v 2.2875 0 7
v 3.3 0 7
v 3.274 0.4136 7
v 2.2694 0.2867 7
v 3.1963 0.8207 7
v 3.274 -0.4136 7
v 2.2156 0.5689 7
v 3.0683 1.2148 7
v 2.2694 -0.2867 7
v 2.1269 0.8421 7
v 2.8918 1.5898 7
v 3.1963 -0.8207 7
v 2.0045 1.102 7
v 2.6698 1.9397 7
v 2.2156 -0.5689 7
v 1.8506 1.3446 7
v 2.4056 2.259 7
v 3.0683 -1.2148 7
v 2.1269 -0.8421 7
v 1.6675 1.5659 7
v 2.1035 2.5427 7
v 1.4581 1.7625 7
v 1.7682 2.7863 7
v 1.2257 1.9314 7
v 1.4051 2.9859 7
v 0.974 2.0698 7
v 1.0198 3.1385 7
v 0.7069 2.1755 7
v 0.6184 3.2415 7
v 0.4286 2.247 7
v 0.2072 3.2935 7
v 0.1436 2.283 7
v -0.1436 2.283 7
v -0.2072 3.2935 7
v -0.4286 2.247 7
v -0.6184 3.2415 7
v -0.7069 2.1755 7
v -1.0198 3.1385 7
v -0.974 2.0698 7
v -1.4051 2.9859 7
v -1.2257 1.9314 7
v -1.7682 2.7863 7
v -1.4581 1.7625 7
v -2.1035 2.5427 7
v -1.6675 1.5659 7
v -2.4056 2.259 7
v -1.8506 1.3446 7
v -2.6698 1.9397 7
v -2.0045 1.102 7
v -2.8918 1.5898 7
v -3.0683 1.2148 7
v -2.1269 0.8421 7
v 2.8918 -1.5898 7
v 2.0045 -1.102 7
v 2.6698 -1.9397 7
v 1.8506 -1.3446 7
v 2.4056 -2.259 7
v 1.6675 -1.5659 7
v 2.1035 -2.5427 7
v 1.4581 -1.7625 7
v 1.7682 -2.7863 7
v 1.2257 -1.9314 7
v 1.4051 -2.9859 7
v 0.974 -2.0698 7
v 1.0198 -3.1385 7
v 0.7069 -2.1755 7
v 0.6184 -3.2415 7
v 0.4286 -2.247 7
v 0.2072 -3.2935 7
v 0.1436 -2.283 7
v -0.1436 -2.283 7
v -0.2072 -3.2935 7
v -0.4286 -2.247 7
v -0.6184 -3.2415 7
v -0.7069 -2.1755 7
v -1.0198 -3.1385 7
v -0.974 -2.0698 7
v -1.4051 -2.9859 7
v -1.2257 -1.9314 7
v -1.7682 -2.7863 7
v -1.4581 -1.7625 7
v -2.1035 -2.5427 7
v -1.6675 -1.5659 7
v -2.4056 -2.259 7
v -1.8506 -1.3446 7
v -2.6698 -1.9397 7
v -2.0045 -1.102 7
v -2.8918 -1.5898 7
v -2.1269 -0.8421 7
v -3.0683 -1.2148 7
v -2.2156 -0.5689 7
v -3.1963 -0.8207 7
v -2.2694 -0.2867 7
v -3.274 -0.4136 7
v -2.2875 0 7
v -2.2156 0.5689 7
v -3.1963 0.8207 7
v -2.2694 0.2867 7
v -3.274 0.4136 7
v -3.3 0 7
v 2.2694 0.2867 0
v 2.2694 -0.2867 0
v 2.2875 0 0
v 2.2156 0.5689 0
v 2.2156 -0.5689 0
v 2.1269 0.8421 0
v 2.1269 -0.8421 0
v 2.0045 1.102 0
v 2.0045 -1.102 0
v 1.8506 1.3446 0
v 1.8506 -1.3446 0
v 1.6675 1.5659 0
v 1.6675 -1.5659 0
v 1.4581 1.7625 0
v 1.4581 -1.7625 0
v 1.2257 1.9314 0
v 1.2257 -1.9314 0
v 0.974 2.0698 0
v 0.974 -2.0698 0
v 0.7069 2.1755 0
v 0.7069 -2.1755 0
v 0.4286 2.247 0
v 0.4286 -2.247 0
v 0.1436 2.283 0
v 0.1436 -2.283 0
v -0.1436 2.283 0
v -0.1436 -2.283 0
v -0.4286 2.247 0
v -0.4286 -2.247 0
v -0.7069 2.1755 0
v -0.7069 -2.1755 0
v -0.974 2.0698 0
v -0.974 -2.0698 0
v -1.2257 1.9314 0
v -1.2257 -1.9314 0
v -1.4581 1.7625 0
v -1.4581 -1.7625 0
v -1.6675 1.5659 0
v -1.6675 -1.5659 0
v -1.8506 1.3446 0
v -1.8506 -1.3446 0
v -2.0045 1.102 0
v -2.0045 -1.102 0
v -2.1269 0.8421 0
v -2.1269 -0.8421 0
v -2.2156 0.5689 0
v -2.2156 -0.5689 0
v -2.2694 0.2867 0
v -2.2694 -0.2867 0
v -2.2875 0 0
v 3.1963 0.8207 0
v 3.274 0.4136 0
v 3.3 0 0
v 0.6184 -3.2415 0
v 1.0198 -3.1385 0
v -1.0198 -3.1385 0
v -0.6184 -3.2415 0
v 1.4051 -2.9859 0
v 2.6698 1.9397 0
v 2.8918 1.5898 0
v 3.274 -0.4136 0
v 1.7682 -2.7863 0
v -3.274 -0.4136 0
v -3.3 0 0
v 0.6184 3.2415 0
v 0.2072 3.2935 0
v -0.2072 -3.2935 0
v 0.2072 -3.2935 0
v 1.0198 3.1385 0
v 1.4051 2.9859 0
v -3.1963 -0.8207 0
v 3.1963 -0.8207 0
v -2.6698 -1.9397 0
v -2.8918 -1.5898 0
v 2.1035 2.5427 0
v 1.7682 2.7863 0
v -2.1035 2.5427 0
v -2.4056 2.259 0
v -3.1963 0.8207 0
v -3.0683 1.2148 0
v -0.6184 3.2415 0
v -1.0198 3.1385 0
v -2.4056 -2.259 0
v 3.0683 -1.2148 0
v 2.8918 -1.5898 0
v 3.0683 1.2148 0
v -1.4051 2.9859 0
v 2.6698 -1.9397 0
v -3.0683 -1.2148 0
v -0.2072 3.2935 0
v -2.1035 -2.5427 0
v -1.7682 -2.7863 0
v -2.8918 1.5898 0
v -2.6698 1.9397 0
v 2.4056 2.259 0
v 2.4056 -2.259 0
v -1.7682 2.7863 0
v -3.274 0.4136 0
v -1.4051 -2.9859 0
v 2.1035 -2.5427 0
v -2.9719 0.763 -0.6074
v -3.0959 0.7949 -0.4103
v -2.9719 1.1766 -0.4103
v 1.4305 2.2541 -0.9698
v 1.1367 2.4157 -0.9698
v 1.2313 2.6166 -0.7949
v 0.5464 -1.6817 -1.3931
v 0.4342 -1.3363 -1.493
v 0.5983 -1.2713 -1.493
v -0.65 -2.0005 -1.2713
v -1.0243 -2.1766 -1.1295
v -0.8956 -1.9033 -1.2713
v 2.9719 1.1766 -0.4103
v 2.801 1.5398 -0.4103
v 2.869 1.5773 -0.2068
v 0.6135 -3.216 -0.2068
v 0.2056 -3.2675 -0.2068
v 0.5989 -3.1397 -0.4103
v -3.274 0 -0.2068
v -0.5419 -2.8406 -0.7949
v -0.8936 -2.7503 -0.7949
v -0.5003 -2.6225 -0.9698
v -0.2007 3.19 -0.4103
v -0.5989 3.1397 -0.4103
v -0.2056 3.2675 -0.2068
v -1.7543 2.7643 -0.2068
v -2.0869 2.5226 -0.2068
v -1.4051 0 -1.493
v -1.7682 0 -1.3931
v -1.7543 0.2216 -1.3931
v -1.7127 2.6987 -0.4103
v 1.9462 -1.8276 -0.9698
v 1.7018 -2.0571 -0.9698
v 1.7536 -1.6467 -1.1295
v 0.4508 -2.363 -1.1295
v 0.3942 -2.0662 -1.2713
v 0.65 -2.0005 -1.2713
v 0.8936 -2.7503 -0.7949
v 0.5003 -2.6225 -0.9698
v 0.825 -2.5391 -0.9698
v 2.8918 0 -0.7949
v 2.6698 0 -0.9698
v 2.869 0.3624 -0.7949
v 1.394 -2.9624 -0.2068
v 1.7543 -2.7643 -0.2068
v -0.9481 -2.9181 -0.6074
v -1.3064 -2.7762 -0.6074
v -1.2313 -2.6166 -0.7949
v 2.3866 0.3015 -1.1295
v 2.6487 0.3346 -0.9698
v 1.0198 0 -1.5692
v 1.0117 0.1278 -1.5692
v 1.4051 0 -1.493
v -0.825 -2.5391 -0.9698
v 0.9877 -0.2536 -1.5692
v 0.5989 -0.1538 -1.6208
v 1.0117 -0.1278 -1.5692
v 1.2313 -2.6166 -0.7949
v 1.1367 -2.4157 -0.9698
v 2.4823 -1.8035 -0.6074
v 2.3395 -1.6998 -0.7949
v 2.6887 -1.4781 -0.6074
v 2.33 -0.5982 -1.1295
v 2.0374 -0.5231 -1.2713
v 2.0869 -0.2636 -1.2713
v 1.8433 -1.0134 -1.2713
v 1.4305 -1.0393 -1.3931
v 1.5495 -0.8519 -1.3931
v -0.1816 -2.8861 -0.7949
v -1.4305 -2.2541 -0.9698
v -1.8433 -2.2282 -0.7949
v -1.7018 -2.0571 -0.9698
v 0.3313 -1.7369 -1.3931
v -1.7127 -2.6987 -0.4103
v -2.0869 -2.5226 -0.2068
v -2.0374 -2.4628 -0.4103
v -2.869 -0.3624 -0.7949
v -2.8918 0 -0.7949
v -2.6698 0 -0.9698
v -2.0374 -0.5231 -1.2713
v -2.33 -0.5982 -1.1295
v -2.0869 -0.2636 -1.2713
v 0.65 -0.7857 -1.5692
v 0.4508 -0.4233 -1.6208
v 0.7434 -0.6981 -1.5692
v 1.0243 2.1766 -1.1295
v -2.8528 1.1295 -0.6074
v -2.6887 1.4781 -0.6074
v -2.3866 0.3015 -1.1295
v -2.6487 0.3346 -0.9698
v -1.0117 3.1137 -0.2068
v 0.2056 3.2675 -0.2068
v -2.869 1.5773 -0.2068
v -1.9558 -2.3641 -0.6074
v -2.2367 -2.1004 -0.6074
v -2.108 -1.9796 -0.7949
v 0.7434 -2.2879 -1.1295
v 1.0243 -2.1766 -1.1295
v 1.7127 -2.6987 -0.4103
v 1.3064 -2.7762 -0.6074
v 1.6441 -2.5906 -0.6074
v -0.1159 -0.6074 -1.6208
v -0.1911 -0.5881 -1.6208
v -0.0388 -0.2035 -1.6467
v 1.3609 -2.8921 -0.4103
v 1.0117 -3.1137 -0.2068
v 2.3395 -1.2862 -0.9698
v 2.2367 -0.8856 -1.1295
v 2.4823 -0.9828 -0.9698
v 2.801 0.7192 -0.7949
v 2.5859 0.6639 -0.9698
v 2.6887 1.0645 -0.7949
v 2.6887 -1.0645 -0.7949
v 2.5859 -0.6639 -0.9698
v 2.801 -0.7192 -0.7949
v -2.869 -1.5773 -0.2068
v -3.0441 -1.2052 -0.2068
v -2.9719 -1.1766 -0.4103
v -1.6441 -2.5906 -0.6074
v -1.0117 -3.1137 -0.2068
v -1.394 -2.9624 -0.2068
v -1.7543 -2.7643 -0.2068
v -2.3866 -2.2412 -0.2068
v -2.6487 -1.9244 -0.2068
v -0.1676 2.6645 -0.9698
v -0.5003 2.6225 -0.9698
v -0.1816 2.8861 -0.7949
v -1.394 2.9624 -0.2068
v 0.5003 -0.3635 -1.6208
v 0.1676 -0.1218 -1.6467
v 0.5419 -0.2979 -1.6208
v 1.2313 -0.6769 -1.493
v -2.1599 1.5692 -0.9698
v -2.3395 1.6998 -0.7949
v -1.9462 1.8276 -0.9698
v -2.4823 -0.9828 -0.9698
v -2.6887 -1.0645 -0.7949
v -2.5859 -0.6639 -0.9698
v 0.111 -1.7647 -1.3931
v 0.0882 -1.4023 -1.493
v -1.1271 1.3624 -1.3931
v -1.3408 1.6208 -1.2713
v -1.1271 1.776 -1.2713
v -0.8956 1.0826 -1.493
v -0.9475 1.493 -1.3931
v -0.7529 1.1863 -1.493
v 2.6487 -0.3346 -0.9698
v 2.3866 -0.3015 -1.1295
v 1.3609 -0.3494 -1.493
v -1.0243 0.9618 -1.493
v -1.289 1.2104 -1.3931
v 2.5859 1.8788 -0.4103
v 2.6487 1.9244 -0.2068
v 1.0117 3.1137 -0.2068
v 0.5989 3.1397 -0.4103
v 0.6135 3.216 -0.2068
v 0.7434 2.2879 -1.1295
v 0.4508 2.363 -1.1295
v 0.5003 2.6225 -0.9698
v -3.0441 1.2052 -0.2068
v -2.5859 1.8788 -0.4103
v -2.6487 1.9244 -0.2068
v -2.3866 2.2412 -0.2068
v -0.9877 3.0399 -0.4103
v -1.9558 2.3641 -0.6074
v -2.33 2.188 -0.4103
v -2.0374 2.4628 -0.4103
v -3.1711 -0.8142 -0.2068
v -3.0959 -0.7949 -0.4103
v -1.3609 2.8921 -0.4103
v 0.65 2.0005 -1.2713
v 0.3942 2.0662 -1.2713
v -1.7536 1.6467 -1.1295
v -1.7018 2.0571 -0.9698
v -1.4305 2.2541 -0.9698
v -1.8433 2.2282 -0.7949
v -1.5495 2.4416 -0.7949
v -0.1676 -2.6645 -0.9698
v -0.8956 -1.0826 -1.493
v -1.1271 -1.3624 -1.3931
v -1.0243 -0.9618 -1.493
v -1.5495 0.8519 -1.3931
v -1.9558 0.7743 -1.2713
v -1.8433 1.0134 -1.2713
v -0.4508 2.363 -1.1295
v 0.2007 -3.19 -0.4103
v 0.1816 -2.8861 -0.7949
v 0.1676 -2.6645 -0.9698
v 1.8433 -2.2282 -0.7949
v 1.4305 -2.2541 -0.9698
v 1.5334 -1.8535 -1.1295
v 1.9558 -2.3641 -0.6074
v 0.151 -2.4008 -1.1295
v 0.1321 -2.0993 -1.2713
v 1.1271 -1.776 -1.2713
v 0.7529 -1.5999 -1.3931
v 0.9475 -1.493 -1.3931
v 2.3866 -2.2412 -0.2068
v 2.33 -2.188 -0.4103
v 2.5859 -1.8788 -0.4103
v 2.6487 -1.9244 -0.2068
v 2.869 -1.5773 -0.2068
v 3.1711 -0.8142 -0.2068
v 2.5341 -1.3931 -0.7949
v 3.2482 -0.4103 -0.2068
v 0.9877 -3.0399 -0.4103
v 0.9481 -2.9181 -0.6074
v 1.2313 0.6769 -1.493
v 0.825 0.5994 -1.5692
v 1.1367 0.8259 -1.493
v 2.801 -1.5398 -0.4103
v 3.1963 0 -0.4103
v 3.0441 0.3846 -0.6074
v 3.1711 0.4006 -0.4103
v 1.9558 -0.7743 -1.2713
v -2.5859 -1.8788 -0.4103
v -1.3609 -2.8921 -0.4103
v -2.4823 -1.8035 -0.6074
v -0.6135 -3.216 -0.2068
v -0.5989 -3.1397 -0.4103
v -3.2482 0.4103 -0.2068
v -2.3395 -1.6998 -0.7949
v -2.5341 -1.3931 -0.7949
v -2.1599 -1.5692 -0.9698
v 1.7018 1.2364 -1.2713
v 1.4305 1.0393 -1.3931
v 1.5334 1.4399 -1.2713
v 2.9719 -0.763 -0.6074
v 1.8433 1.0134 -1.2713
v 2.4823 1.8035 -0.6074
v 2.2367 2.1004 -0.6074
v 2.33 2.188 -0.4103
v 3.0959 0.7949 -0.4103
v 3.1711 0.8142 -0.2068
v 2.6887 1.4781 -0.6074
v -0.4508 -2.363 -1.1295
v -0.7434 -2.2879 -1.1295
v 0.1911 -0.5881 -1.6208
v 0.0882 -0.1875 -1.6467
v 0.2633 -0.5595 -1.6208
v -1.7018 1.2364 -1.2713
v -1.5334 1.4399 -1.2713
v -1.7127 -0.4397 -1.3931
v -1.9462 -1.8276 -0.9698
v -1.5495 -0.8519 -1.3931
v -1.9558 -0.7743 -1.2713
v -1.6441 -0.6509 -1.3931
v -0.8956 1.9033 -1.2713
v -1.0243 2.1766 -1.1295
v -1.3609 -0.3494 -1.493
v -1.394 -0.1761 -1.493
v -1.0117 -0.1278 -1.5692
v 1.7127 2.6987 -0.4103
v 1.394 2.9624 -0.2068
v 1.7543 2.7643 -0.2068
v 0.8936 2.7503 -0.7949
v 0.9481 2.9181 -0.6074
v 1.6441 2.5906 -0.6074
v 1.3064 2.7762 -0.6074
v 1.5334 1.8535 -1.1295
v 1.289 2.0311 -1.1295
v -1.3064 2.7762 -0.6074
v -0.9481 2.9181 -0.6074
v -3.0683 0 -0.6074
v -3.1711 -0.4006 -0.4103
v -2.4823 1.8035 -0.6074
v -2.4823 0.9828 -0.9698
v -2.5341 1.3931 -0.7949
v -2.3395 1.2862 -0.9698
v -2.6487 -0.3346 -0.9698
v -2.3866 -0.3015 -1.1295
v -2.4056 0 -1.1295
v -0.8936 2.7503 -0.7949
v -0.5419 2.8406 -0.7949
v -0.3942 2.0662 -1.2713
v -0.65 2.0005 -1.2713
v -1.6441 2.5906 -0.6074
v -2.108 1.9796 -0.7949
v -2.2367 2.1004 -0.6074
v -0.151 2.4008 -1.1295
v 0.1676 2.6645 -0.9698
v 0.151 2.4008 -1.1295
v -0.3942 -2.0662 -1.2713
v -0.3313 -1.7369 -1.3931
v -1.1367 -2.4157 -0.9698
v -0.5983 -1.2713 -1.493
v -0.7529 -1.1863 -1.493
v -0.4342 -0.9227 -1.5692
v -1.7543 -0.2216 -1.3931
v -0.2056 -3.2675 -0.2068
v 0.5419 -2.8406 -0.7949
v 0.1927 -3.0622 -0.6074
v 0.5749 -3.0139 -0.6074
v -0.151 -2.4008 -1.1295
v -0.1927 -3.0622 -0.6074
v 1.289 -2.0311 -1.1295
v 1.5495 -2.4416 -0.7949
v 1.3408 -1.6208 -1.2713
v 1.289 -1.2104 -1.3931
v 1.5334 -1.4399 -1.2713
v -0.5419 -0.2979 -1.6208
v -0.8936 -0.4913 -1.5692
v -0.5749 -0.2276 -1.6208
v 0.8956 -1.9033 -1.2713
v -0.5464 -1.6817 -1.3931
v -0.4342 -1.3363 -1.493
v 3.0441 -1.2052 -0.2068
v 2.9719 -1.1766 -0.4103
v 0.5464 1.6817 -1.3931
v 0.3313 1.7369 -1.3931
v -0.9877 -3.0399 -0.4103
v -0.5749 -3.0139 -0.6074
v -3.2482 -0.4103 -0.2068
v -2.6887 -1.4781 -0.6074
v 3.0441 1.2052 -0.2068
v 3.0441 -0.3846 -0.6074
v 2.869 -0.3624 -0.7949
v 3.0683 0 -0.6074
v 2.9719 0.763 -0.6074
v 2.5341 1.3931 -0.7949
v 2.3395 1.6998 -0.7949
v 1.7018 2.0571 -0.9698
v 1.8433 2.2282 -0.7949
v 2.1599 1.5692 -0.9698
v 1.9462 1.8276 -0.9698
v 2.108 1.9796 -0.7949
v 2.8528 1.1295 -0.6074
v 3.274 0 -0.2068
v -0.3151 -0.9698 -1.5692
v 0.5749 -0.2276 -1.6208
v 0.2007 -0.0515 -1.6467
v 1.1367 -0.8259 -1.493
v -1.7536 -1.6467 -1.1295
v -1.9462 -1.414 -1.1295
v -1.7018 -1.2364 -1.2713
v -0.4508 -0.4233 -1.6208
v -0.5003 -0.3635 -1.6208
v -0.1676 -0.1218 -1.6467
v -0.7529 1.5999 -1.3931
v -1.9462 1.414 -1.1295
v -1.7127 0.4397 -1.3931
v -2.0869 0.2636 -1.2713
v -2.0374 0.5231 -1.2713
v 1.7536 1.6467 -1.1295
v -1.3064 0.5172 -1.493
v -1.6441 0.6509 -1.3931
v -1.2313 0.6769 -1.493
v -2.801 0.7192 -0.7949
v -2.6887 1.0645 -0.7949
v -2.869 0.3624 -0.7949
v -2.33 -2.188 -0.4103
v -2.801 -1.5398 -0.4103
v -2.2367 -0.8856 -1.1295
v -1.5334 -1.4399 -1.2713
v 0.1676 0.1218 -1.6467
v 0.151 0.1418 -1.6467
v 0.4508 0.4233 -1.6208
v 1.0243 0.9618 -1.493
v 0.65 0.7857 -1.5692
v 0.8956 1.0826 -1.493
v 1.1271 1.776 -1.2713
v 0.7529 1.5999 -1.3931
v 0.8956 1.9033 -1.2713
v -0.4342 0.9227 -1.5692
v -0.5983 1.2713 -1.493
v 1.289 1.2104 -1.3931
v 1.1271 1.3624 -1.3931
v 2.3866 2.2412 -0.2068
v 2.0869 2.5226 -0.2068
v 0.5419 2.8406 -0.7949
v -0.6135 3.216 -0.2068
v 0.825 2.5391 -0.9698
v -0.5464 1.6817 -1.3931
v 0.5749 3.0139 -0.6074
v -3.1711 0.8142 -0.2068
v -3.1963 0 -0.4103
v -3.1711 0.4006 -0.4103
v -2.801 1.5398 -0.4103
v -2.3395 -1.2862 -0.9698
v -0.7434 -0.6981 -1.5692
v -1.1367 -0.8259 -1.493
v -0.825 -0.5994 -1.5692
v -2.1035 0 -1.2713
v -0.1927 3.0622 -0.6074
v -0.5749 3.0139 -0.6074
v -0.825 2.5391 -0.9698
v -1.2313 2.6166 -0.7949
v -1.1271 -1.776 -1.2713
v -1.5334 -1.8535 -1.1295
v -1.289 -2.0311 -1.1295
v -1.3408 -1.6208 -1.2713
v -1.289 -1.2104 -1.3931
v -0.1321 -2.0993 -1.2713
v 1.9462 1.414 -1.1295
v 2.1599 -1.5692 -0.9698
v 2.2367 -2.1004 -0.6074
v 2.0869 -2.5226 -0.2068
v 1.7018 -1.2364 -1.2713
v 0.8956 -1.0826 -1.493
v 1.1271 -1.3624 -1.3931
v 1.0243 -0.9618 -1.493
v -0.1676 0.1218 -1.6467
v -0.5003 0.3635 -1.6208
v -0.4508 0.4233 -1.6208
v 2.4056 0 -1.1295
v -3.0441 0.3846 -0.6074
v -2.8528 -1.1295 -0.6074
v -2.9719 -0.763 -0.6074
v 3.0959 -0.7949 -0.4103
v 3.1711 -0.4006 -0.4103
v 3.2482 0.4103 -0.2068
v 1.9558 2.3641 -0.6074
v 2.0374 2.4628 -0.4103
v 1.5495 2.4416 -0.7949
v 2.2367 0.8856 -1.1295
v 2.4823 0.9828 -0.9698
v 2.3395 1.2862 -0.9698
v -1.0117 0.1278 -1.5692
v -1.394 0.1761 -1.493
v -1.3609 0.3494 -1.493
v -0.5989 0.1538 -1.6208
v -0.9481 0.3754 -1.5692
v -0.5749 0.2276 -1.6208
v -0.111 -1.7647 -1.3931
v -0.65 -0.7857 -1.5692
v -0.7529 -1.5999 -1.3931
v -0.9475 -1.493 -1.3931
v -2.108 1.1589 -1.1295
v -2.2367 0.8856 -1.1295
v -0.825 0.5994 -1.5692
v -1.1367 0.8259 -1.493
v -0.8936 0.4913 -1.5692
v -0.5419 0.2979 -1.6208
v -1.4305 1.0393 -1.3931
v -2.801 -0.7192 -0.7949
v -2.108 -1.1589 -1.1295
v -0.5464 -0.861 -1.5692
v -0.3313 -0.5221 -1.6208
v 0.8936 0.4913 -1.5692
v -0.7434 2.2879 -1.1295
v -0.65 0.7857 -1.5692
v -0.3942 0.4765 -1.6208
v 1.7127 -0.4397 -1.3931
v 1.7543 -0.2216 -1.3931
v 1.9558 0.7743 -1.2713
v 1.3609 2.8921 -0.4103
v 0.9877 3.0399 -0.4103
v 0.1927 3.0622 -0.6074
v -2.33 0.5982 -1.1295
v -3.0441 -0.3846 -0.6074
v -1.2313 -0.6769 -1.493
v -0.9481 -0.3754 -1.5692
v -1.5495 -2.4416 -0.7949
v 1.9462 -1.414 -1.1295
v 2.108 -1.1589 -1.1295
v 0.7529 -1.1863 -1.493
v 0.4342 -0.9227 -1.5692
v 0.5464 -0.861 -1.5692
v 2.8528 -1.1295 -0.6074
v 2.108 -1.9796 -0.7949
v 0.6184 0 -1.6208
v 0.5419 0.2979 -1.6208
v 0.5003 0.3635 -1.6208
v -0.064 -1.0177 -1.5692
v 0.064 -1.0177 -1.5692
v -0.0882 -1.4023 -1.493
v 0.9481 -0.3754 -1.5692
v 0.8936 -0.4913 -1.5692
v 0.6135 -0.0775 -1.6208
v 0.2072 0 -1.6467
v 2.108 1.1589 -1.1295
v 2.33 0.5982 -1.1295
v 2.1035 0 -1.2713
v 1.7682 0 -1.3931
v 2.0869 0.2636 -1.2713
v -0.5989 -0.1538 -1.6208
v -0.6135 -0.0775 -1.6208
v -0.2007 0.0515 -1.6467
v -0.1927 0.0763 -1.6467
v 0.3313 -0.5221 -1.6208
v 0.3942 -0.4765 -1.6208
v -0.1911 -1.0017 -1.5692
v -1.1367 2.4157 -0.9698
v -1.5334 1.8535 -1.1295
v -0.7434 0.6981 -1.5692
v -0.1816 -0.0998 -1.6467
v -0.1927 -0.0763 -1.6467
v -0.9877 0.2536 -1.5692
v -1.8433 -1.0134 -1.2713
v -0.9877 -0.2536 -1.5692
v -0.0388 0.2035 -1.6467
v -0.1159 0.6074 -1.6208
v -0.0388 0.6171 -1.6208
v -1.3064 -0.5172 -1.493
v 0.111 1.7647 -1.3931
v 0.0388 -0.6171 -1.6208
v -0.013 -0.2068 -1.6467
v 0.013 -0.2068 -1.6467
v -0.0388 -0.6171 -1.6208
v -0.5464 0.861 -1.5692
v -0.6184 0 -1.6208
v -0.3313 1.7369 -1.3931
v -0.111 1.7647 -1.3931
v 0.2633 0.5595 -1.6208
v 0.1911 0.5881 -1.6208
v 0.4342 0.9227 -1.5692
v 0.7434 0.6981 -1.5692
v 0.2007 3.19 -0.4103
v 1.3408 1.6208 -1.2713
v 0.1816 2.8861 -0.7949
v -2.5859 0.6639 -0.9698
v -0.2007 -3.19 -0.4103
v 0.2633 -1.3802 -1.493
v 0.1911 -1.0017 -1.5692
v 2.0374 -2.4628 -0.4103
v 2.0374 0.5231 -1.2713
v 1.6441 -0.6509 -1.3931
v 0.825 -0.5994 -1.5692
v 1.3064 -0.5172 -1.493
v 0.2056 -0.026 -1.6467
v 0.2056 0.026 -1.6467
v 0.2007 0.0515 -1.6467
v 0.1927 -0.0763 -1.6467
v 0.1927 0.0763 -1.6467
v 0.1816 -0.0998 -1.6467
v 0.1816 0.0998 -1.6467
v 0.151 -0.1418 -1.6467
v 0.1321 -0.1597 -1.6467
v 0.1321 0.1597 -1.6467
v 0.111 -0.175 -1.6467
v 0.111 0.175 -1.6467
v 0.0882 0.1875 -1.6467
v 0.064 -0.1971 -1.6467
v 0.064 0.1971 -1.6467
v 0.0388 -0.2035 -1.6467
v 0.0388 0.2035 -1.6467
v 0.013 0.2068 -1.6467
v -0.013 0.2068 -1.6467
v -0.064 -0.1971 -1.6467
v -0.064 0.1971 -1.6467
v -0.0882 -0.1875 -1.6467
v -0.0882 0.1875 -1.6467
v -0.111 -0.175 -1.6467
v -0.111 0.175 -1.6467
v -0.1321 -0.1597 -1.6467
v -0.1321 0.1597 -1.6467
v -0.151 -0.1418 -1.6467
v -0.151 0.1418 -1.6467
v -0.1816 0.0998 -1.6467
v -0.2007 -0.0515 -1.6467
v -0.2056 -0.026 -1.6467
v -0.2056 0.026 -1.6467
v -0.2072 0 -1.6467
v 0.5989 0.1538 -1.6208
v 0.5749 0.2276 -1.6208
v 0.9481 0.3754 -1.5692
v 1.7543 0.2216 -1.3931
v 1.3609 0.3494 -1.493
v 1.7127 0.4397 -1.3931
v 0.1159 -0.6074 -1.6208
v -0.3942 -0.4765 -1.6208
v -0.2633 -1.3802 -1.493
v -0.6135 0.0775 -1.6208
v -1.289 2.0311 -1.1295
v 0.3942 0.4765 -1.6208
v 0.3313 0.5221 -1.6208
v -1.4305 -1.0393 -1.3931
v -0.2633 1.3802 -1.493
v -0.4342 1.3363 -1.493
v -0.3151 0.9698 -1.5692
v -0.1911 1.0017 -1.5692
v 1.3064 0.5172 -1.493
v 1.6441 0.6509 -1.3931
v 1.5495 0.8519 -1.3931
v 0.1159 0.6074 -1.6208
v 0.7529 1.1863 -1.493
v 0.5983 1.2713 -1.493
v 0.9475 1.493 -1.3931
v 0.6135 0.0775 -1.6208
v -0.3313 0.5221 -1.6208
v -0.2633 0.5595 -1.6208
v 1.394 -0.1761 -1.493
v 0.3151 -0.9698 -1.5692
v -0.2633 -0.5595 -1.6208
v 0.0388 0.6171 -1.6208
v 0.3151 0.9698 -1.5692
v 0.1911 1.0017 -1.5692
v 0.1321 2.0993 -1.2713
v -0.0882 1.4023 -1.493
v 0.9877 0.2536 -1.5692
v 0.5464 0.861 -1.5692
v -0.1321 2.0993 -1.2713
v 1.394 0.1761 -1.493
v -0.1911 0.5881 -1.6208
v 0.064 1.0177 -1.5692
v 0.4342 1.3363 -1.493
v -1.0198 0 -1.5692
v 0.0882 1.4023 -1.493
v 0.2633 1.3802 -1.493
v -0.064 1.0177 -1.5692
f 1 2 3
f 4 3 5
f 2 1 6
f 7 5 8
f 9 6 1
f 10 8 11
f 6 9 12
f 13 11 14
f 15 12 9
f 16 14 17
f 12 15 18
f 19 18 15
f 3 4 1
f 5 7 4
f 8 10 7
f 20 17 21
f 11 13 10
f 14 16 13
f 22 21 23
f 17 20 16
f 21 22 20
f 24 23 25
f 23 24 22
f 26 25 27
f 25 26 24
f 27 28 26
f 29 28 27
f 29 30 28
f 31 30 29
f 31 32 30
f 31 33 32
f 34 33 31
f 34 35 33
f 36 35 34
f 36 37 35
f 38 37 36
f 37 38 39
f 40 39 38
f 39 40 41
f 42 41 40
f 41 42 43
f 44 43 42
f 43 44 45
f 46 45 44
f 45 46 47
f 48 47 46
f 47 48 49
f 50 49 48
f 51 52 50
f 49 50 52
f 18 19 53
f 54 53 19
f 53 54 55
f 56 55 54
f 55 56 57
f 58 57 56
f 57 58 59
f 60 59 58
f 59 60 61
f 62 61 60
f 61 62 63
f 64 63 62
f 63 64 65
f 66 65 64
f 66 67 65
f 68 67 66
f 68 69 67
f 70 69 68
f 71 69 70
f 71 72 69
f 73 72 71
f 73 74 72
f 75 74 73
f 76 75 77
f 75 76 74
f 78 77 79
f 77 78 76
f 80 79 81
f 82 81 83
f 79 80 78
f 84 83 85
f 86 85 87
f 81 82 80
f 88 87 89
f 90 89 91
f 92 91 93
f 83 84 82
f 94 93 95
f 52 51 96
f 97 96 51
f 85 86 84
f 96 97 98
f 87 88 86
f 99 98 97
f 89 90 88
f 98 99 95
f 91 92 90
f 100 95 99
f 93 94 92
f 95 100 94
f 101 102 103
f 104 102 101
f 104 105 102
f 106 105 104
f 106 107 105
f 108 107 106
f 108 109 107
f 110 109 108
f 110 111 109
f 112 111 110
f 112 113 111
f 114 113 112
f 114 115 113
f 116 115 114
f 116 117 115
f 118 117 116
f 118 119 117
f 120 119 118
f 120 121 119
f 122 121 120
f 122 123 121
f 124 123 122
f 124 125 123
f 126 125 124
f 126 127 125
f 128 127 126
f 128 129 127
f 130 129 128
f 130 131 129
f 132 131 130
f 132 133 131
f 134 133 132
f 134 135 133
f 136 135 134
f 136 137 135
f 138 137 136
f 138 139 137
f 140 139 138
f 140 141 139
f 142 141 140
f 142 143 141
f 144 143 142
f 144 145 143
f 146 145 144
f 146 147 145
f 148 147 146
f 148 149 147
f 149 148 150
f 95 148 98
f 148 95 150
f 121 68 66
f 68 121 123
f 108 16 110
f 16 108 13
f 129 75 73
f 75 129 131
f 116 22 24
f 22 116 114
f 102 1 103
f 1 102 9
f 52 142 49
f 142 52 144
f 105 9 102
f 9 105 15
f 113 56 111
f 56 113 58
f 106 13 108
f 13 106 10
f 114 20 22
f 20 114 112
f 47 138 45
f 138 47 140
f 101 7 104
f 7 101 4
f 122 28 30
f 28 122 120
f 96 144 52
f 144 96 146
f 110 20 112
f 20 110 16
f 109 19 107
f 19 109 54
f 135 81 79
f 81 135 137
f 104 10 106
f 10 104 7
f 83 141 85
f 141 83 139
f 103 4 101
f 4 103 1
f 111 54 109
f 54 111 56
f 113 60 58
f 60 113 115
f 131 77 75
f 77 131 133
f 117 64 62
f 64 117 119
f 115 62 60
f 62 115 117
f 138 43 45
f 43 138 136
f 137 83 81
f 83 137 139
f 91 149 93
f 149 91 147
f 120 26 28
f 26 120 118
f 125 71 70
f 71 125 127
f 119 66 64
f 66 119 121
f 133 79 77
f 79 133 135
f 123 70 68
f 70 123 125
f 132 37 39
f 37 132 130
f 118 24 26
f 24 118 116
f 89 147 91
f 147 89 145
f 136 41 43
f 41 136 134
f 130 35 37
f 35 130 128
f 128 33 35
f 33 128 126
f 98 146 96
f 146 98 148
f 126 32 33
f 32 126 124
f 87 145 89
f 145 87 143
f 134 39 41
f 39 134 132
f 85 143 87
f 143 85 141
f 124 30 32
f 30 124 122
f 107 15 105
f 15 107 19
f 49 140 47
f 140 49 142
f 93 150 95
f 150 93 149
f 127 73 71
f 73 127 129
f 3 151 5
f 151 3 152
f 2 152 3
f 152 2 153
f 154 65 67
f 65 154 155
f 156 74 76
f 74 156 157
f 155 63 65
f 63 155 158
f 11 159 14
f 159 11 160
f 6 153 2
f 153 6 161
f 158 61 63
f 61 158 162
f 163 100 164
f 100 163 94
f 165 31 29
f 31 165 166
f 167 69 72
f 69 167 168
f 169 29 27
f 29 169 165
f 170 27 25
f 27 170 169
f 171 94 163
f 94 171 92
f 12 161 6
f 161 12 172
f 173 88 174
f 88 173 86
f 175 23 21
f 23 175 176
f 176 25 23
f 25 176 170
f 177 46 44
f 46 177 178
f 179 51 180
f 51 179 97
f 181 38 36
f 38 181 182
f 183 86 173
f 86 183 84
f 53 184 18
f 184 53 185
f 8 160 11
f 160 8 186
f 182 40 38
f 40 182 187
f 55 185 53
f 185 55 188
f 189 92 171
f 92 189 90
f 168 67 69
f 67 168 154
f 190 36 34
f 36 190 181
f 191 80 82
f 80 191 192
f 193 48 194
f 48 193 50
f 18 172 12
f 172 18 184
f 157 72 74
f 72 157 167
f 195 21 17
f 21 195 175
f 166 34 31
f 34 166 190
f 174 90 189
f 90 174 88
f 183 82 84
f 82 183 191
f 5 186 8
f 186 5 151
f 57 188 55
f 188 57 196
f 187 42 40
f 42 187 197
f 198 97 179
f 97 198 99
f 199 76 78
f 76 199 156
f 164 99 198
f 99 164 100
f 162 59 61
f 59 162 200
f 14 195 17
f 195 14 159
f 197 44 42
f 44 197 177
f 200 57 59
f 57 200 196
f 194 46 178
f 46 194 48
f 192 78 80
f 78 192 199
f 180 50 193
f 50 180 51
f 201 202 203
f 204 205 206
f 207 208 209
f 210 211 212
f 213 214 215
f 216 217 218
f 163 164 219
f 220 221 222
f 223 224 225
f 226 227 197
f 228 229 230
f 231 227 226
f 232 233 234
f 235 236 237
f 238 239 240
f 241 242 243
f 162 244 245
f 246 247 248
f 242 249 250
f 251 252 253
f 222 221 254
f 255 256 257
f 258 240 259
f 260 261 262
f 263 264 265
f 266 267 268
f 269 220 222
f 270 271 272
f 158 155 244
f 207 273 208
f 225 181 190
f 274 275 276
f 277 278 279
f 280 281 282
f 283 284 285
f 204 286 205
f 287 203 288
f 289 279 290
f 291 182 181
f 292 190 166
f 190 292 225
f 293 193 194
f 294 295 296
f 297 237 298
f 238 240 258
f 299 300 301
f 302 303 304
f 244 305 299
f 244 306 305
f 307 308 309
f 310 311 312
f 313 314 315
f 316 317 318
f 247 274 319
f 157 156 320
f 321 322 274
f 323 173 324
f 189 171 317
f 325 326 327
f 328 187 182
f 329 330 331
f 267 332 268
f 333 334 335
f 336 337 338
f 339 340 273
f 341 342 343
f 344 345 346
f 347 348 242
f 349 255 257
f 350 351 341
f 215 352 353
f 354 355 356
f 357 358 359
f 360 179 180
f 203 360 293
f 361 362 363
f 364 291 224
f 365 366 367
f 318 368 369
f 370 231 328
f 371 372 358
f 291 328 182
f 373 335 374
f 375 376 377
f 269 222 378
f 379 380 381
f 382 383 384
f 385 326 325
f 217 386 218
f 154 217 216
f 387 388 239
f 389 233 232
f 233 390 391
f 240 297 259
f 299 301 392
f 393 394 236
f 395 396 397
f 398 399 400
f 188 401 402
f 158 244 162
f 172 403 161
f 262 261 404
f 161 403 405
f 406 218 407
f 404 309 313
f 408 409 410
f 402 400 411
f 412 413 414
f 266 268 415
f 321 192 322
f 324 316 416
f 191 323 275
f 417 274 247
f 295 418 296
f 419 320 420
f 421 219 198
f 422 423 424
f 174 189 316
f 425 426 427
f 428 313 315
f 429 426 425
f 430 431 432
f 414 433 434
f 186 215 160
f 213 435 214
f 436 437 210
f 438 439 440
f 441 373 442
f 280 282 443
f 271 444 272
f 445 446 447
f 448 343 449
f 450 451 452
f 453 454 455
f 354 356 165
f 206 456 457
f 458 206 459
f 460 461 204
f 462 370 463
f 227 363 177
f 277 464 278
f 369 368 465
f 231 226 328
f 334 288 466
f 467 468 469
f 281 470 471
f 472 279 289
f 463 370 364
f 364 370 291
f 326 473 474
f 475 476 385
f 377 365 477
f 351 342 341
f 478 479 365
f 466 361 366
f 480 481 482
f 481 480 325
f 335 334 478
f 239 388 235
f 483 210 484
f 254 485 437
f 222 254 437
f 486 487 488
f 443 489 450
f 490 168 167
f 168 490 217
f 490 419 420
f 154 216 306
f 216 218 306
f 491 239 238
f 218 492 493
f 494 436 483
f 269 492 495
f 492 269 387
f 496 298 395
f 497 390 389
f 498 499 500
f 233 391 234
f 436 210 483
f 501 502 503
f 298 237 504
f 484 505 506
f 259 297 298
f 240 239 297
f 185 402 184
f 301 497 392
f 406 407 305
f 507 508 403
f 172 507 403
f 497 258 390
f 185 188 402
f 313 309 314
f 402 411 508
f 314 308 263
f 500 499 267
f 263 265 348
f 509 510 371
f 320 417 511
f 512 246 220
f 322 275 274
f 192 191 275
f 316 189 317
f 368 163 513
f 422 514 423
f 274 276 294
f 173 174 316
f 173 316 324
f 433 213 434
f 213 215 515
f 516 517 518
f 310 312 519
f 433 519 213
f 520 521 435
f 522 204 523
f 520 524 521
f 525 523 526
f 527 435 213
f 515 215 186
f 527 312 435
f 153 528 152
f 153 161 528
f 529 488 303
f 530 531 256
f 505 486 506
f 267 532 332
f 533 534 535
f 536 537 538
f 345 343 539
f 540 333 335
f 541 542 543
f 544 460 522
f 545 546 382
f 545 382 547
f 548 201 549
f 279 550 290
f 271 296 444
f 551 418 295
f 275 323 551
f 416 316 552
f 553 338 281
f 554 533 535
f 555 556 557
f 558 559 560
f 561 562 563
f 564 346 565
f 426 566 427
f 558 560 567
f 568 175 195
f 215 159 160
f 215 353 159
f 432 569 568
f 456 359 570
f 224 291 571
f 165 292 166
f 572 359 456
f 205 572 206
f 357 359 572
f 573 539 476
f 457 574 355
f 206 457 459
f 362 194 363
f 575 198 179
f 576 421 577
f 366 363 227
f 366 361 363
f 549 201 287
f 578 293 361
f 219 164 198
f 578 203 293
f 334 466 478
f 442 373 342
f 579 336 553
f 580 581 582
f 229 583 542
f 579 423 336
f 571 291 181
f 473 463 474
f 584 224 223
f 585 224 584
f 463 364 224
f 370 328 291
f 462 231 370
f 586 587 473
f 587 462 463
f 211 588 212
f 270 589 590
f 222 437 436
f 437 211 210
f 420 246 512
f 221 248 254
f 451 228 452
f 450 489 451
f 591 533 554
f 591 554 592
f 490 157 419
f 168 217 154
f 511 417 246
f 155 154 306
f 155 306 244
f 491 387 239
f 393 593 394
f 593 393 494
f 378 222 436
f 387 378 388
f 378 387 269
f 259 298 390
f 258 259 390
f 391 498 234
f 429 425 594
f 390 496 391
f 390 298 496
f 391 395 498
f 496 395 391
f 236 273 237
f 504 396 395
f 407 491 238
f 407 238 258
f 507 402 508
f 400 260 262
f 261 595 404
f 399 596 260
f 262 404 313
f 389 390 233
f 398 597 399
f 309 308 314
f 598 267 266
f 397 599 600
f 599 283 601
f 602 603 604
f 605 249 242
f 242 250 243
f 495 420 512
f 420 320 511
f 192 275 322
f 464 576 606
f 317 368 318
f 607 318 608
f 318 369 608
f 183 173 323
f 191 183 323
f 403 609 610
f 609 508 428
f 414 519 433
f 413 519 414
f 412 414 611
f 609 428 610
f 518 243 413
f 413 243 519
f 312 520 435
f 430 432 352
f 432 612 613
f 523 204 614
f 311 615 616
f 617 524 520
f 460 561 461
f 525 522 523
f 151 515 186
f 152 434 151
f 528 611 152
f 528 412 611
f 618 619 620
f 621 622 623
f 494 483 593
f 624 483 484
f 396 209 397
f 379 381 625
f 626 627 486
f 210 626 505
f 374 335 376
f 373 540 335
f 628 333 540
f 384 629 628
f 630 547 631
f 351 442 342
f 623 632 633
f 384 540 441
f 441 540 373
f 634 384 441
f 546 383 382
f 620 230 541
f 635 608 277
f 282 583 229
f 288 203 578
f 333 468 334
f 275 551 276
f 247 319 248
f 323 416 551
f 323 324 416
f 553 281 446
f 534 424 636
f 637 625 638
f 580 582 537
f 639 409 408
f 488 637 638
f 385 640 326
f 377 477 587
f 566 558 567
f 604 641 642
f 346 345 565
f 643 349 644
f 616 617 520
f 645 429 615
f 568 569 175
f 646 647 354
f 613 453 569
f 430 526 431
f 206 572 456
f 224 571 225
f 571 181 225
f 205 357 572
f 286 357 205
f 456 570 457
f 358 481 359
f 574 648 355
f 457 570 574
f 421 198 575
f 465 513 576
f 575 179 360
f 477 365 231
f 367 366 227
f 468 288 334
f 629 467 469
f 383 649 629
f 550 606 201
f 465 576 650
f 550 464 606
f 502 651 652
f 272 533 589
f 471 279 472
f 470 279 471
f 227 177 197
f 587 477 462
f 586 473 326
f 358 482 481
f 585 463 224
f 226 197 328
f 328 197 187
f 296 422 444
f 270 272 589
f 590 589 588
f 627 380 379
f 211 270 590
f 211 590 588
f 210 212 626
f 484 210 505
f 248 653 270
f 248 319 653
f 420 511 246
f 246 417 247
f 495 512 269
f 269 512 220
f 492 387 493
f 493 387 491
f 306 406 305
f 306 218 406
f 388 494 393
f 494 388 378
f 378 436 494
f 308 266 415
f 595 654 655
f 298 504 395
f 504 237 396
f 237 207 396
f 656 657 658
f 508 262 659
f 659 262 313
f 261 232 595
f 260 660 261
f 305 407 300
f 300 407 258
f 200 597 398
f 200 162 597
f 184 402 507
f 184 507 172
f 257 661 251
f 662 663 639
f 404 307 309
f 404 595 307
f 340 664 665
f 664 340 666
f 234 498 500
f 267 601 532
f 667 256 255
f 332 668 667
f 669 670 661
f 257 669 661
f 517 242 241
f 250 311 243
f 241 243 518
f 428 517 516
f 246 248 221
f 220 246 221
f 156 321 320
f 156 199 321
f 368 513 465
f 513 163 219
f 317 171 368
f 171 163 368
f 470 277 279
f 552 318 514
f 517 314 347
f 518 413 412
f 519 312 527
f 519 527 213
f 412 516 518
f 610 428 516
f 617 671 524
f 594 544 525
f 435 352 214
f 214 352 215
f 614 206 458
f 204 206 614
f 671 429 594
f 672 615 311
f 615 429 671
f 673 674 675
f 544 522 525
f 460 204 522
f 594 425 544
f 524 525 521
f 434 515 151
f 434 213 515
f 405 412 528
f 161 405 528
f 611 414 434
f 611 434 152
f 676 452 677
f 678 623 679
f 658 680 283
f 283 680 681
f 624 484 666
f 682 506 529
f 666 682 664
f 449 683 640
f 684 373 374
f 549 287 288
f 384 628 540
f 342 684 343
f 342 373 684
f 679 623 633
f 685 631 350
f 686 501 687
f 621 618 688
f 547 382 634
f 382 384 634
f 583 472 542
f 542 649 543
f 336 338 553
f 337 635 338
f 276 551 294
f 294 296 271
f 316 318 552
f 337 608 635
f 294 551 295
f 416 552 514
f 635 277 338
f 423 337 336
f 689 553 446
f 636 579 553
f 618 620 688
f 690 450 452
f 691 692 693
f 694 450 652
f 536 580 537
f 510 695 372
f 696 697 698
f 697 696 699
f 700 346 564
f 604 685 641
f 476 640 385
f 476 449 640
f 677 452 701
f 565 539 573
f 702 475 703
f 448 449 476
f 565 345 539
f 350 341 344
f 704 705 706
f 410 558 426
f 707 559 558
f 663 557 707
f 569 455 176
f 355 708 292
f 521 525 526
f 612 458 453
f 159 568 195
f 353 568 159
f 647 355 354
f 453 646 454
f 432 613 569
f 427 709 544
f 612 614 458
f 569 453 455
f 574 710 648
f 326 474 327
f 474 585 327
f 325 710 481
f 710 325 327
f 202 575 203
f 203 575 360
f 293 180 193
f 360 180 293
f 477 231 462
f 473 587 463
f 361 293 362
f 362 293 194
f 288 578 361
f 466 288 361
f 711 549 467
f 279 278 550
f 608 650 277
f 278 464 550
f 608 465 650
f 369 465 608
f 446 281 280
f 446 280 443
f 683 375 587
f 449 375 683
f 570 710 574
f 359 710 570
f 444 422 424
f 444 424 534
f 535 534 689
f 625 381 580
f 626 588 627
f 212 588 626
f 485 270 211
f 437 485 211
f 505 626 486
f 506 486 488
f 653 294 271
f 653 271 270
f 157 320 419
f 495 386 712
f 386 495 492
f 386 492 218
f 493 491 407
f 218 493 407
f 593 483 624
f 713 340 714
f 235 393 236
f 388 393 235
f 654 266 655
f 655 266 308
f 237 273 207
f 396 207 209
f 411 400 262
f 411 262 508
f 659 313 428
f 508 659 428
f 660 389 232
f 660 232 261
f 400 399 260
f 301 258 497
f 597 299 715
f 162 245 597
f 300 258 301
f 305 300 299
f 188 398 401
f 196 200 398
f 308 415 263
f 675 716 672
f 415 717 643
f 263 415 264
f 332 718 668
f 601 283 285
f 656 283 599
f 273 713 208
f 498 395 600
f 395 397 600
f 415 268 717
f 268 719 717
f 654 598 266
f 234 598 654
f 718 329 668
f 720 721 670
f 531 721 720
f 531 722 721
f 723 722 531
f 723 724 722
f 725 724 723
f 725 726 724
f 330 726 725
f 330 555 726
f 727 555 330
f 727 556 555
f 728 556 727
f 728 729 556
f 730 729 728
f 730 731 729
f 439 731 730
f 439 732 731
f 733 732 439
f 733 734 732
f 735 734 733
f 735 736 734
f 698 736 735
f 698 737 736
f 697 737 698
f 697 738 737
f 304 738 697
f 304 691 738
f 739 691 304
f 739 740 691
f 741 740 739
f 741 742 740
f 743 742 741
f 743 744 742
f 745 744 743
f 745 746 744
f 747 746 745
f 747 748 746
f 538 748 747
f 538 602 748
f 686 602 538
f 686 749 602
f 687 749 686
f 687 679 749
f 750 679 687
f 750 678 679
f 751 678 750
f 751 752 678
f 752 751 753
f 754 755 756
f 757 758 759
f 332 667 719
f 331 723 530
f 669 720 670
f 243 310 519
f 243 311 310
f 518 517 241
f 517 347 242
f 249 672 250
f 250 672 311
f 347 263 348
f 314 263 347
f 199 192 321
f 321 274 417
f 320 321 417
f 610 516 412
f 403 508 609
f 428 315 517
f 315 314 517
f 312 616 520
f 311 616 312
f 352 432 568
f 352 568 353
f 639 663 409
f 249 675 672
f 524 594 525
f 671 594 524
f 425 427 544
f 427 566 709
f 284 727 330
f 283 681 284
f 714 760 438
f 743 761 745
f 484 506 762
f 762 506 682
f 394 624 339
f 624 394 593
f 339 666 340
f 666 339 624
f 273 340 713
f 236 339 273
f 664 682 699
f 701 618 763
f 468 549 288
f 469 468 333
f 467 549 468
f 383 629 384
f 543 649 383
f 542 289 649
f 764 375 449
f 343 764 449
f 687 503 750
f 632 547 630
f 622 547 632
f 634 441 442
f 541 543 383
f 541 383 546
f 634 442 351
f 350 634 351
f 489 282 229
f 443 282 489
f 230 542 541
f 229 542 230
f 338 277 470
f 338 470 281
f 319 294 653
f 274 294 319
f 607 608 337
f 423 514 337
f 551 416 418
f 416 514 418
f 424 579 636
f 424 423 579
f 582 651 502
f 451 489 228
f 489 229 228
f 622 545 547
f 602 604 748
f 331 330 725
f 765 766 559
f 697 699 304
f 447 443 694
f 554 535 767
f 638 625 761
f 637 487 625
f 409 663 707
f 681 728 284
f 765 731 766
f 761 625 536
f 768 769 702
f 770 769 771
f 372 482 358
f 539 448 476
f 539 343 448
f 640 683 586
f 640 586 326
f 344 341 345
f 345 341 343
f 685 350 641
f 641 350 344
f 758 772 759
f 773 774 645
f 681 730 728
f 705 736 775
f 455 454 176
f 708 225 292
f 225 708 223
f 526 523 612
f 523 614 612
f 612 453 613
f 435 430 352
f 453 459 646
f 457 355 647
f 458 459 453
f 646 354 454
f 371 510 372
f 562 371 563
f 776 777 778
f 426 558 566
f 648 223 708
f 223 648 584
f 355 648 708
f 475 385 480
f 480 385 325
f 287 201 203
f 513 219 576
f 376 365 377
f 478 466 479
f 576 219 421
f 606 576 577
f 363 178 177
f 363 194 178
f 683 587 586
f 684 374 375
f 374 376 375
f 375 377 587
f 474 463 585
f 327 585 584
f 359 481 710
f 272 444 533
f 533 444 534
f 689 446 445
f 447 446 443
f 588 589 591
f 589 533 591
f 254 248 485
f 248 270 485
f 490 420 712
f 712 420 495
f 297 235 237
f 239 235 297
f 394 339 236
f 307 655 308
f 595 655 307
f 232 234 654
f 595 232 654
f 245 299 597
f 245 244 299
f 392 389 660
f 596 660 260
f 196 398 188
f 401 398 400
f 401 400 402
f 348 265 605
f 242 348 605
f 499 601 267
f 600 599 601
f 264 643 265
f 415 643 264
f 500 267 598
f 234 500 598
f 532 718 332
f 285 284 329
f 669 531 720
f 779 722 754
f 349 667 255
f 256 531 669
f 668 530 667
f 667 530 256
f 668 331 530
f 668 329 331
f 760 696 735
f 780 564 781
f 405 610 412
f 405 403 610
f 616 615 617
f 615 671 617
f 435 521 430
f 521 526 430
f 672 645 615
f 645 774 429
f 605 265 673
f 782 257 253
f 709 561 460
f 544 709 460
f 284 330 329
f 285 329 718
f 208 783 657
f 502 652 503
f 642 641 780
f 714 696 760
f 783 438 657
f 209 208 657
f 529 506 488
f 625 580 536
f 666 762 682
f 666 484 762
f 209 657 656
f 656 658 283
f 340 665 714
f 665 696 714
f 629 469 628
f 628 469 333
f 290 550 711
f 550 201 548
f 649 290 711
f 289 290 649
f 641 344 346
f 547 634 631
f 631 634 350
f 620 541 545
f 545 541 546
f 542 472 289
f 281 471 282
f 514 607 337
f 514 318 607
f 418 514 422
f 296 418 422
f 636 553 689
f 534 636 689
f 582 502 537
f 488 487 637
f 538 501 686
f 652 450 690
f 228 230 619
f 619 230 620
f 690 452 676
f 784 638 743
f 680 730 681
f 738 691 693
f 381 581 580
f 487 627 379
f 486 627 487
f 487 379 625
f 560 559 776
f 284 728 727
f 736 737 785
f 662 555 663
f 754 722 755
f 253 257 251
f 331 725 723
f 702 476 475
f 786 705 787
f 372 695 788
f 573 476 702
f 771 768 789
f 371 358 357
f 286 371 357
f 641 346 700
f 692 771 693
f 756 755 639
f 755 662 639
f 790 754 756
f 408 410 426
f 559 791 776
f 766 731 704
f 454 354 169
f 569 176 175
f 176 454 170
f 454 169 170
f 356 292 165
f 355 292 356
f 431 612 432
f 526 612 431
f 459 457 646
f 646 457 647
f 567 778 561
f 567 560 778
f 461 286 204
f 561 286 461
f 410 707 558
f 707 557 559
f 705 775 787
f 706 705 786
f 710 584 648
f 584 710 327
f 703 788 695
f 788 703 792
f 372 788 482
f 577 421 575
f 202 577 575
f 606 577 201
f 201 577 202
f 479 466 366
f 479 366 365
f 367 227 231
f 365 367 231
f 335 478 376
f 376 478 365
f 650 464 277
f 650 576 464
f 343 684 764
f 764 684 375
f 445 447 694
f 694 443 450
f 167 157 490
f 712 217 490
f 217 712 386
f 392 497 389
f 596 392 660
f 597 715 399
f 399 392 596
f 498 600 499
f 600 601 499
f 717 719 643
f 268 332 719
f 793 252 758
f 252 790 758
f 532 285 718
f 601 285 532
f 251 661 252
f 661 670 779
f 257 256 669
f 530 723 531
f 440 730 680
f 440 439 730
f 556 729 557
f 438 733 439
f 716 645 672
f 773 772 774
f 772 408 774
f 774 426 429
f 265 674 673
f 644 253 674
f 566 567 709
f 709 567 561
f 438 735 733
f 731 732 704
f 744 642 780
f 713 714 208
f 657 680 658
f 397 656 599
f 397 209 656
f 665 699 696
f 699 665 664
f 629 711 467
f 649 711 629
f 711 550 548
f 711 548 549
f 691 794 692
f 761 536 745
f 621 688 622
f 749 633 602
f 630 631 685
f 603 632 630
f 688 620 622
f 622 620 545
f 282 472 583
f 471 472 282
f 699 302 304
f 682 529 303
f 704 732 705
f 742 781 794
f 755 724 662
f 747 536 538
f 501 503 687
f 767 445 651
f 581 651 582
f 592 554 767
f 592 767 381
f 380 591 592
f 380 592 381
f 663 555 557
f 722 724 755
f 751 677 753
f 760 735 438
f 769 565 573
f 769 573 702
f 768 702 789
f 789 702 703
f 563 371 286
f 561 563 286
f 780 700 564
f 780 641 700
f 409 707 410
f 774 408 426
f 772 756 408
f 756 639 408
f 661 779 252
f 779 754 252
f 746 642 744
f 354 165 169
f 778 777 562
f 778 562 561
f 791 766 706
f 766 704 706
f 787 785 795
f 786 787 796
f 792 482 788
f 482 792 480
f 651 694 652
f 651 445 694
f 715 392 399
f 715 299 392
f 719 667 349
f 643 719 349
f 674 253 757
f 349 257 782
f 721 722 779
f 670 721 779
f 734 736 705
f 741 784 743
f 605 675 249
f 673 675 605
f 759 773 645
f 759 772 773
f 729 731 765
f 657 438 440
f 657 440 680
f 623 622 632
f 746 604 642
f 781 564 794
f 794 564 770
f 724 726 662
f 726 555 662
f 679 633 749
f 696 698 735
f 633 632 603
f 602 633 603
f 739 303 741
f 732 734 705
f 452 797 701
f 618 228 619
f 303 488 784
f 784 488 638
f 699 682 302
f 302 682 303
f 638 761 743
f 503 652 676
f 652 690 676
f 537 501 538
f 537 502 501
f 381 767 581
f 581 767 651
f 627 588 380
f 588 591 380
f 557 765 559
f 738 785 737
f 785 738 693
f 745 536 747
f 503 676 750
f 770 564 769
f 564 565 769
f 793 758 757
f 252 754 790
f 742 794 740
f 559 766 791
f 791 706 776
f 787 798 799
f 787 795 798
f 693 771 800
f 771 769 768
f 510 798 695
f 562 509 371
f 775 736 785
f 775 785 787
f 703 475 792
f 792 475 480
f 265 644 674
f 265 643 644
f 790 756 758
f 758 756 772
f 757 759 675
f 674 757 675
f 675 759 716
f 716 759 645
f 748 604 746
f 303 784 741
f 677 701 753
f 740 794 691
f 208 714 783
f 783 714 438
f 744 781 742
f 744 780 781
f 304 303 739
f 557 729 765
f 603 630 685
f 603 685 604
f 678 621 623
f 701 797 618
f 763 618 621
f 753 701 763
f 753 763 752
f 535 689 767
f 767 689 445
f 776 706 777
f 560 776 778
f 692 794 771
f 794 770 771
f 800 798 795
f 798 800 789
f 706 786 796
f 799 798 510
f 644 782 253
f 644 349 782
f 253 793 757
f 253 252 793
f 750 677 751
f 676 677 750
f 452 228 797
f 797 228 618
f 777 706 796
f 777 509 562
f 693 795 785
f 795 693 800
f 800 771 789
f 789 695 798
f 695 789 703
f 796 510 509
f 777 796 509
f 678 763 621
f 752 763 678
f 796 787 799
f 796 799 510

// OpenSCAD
use <../lib/BaNG_Metric.scad>
$fn = 50;

screw = 5;
screw_r = screw / 2;
thickness = 0.8;
height = 7;
adjustment = 0.2;


intersection() {
    nut(screw, height_=height, tolerance="Loose", thread_adjustment=adjustment);
    cylinder(h = height, r = screw_r + thickness);
}
difference() {
    scale([1,1,0.5]) sphere(screw_r + thickness);
    translate([-10, -10, 0]) cube(20);
}
